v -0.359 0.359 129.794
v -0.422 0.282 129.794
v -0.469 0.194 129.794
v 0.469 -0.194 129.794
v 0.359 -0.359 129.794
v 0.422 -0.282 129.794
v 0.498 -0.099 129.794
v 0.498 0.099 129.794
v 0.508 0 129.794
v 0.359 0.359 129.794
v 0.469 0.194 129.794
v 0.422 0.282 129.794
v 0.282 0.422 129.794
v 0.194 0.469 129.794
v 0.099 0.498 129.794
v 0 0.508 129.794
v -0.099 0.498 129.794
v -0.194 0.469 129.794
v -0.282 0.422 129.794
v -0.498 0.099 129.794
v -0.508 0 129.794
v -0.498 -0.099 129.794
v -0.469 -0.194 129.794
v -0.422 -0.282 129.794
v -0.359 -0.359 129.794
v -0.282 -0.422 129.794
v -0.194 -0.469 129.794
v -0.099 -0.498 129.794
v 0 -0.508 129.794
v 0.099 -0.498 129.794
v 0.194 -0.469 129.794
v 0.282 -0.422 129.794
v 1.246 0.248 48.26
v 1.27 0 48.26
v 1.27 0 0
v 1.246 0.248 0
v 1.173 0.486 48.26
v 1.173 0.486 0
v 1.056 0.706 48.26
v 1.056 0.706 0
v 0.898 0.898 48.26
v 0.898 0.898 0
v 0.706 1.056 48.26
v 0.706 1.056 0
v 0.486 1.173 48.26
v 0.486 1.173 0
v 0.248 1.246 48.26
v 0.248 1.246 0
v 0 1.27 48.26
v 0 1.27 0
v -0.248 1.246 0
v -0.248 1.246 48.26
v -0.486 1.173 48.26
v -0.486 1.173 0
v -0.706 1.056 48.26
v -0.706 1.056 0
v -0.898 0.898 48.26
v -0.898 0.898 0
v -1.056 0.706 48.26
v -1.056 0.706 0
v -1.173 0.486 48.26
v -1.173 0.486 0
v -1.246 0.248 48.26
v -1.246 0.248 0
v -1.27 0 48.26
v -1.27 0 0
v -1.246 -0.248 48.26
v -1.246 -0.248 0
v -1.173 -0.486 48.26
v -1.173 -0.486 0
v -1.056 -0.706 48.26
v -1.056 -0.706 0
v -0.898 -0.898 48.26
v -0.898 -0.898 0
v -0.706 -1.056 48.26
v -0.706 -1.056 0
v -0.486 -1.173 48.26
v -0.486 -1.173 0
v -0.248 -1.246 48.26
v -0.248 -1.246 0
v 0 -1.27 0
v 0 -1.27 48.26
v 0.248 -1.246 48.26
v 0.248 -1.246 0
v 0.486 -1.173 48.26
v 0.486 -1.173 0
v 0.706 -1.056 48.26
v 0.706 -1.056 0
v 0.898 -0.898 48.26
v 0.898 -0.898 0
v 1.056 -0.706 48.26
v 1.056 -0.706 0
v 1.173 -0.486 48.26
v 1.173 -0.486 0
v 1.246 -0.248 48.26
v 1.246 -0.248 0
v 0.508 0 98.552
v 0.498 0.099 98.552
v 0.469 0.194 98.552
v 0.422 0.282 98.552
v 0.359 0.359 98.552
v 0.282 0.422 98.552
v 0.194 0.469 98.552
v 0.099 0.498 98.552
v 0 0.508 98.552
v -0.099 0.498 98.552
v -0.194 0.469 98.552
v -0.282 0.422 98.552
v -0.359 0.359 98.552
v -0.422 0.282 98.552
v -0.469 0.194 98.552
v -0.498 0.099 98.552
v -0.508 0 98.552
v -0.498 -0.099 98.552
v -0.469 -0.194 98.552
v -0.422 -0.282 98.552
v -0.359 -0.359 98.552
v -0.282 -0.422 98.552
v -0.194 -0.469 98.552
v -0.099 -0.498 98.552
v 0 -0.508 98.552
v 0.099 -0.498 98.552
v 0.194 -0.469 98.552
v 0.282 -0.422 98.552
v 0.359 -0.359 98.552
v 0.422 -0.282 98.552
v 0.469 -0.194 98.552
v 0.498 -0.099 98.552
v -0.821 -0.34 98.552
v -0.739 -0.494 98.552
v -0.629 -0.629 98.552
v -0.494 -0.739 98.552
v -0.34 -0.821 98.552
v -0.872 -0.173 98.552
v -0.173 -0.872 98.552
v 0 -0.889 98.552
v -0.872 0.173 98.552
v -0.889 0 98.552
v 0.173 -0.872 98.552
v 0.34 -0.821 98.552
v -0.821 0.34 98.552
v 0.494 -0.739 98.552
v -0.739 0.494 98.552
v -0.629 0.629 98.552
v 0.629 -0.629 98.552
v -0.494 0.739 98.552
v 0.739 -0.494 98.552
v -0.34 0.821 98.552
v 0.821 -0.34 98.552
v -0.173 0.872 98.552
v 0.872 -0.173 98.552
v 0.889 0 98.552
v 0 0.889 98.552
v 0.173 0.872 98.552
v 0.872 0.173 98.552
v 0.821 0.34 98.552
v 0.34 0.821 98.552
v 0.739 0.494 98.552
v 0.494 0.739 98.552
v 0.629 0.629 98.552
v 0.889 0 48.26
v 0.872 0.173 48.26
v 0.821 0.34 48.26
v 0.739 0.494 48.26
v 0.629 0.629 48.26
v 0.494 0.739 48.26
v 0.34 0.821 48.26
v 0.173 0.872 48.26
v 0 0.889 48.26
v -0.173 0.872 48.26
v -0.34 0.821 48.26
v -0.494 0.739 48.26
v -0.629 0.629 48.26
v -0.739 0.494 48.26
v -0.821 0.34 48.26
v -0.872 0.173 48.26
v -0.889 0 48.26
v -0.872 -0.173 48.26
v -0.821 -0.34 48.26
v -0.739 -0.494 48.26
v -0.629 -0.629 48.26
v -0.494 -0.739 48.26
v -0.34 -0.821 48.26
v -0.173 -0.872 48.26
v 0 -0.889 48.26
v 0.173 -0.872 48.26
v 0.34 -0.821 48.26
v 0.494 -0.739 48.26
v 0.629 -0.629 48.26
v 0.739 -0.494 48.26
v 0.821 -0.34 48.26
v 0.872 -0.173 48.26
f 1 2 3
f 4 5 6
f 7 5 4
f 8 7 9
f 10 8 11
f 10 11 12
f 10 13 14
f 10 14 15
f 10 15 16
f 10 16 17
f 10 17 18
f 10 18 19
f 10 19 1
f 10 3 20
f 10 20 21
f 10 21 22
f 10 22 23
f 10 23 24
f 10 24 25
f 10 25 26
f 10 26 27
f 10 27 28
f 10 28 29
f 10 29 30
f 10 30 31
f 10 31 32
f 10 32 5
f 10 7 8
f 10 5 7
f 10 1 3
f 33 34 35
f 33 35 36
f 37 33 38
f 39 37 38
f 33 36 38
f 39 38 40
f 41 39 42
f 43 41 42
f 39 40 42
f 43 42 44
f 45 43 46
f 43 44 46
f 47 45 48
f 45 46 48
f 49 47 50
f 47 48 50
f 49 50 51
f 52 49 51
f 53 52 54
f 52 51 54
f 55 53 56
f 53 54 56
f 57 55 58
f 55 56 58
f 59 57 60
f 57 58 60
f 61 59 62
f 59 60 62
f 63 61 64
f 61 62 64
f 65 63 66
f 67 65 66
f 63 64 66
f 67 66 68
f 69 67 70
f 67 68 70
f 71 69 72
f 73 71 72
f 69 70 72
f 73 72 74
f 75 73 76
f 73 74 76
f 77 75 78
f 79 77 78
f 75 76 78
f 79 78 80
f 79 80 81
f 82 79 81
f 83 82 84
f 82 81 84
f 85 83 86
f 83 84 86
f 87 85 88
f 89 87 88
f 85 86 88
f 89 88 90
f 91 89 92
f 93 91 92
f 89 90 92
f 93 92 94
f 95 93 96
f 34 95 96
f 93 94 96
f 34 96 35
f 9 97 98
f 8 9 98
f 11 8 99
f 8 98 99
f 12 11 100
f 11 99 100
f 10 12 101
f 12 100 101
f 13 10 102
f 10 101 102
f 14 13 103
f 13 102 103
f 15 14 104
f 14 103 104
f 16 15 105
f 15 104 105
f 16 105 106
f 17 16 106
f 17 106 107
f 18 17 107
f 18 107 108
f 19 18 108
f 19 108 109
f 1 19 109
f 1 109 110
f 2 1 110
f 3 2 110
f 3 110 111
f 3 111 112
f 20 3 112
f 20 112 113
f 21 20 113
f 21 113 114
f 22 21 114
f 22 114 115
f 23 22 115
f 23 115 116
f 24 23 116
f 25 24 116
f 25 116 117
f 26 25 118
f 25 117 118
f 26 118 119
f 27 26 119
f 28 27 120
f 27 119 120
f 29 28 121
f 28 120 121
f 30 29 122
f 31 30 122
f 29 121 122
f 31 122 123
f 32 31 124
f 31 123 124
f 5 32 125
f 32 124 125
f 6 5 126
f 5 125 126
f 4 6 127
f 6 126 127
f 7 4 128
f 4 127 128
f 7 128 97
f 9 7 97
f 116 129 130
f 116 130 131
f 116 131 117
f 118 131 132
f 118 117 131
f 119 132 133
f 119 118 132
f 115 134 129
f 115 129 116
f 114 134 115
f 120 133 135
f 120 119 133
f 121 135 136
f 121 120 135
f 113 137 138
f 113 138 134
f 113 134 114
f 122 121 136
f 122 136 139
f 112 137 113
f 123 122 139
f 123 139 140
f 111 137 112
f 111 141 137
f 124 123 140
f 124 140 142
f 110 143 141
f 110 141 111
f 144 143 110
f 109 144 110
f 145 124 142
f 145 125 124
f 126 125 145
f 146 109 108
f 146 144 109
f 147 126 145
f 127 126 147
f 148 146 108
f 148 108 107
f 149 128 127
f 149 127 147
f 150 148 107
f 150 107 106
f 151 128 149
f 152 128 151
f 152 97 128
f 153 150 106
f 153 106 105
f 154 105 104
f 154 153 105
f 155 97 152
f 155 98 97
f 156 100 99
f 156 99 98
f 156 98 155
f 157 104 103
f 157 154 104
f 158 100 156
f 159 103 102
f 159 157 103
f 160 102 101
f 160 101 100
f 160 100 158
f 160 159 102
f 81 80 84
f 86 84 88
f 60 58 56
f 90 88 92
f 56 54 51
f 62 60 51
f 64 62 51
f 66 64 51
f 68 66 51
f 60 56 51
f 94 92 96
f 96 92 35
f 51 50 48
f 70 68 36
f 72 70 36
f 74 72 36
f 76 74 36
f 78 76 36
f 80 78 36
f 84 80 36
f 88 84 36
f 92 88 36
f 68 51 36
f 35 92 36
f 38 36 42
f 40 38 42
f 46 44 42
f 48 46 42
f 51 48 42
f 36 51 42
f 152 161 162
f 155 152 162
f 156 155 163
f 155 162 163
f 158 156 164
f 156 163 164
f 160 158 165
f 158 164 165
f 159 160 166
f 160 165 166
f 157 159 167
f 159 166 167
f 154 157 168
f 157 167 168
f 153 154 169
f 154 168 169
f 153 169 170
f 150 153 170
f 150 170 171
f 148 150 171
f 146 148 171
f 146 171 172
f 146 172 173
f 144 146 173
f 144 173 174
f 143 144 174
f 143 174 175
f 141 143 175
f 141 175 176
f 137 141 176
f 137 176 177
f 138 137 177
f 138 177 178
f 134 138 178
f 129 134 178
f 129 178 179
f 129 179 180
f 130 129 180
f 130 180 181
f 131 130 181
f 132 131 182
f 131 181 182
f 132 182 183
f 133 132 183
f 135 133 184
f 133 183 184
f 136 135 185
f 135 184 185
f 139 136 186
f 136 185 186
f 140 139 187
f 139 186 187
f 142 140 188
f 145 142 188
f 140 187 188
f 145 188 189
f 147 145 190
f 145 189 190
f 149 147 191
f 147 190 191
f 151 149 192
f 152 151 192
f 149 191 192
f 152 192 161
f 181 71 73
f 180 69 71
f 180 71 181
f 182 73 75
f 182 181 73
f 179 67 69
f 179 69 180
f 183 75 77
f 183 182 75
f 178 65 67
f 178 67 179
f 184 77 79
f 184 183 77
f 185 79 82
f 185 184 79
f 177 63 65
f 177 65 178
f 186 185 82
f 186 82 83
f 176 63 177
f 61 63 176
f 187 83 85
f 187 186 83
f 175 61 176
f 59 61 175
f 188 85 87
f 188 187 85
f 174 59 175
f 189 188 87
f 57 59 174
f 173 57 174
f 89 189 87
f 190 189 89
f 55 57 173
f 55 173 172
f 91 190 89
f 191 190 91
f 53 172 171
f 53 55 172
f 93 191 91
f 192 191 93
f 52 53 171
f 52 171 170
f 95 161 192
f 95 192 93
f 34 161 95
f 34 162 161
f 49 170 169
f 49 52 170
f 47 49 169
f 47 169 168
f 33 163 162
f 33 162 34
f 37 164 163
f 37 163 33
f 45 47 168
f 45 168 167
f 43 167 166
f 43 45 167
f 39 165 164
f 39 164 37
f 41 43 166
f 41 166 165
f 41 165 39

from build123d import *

# Parameters (mm, degrees)
F0_R     = 1.27
F1_DEPTH = 48.26
F2_R     = 0.889
F3_DEPTH = 98.552
F4_R     = 0.508
F5_DEPTH = 129.794


with BuildPart() as f1:
    # F0 (on Top) → F1 (new body)
    with BuildSketch(Plane.XY):
        Circle(F0_R)
    extrude(amount=F1_DEPTH)

    # F2 (on Top) → F3 (join)
    with BuildSketch(Plane.XY):
        Circle(F2_R)
    extrude(amount=F3_DEPTH)

    # F4 (on Top) → F5 (join)
    with BuildSketch(Plane.XY):
        Circle(F4_R)
    extrude(amount=F5_DEPTH)


solid = f1.part
